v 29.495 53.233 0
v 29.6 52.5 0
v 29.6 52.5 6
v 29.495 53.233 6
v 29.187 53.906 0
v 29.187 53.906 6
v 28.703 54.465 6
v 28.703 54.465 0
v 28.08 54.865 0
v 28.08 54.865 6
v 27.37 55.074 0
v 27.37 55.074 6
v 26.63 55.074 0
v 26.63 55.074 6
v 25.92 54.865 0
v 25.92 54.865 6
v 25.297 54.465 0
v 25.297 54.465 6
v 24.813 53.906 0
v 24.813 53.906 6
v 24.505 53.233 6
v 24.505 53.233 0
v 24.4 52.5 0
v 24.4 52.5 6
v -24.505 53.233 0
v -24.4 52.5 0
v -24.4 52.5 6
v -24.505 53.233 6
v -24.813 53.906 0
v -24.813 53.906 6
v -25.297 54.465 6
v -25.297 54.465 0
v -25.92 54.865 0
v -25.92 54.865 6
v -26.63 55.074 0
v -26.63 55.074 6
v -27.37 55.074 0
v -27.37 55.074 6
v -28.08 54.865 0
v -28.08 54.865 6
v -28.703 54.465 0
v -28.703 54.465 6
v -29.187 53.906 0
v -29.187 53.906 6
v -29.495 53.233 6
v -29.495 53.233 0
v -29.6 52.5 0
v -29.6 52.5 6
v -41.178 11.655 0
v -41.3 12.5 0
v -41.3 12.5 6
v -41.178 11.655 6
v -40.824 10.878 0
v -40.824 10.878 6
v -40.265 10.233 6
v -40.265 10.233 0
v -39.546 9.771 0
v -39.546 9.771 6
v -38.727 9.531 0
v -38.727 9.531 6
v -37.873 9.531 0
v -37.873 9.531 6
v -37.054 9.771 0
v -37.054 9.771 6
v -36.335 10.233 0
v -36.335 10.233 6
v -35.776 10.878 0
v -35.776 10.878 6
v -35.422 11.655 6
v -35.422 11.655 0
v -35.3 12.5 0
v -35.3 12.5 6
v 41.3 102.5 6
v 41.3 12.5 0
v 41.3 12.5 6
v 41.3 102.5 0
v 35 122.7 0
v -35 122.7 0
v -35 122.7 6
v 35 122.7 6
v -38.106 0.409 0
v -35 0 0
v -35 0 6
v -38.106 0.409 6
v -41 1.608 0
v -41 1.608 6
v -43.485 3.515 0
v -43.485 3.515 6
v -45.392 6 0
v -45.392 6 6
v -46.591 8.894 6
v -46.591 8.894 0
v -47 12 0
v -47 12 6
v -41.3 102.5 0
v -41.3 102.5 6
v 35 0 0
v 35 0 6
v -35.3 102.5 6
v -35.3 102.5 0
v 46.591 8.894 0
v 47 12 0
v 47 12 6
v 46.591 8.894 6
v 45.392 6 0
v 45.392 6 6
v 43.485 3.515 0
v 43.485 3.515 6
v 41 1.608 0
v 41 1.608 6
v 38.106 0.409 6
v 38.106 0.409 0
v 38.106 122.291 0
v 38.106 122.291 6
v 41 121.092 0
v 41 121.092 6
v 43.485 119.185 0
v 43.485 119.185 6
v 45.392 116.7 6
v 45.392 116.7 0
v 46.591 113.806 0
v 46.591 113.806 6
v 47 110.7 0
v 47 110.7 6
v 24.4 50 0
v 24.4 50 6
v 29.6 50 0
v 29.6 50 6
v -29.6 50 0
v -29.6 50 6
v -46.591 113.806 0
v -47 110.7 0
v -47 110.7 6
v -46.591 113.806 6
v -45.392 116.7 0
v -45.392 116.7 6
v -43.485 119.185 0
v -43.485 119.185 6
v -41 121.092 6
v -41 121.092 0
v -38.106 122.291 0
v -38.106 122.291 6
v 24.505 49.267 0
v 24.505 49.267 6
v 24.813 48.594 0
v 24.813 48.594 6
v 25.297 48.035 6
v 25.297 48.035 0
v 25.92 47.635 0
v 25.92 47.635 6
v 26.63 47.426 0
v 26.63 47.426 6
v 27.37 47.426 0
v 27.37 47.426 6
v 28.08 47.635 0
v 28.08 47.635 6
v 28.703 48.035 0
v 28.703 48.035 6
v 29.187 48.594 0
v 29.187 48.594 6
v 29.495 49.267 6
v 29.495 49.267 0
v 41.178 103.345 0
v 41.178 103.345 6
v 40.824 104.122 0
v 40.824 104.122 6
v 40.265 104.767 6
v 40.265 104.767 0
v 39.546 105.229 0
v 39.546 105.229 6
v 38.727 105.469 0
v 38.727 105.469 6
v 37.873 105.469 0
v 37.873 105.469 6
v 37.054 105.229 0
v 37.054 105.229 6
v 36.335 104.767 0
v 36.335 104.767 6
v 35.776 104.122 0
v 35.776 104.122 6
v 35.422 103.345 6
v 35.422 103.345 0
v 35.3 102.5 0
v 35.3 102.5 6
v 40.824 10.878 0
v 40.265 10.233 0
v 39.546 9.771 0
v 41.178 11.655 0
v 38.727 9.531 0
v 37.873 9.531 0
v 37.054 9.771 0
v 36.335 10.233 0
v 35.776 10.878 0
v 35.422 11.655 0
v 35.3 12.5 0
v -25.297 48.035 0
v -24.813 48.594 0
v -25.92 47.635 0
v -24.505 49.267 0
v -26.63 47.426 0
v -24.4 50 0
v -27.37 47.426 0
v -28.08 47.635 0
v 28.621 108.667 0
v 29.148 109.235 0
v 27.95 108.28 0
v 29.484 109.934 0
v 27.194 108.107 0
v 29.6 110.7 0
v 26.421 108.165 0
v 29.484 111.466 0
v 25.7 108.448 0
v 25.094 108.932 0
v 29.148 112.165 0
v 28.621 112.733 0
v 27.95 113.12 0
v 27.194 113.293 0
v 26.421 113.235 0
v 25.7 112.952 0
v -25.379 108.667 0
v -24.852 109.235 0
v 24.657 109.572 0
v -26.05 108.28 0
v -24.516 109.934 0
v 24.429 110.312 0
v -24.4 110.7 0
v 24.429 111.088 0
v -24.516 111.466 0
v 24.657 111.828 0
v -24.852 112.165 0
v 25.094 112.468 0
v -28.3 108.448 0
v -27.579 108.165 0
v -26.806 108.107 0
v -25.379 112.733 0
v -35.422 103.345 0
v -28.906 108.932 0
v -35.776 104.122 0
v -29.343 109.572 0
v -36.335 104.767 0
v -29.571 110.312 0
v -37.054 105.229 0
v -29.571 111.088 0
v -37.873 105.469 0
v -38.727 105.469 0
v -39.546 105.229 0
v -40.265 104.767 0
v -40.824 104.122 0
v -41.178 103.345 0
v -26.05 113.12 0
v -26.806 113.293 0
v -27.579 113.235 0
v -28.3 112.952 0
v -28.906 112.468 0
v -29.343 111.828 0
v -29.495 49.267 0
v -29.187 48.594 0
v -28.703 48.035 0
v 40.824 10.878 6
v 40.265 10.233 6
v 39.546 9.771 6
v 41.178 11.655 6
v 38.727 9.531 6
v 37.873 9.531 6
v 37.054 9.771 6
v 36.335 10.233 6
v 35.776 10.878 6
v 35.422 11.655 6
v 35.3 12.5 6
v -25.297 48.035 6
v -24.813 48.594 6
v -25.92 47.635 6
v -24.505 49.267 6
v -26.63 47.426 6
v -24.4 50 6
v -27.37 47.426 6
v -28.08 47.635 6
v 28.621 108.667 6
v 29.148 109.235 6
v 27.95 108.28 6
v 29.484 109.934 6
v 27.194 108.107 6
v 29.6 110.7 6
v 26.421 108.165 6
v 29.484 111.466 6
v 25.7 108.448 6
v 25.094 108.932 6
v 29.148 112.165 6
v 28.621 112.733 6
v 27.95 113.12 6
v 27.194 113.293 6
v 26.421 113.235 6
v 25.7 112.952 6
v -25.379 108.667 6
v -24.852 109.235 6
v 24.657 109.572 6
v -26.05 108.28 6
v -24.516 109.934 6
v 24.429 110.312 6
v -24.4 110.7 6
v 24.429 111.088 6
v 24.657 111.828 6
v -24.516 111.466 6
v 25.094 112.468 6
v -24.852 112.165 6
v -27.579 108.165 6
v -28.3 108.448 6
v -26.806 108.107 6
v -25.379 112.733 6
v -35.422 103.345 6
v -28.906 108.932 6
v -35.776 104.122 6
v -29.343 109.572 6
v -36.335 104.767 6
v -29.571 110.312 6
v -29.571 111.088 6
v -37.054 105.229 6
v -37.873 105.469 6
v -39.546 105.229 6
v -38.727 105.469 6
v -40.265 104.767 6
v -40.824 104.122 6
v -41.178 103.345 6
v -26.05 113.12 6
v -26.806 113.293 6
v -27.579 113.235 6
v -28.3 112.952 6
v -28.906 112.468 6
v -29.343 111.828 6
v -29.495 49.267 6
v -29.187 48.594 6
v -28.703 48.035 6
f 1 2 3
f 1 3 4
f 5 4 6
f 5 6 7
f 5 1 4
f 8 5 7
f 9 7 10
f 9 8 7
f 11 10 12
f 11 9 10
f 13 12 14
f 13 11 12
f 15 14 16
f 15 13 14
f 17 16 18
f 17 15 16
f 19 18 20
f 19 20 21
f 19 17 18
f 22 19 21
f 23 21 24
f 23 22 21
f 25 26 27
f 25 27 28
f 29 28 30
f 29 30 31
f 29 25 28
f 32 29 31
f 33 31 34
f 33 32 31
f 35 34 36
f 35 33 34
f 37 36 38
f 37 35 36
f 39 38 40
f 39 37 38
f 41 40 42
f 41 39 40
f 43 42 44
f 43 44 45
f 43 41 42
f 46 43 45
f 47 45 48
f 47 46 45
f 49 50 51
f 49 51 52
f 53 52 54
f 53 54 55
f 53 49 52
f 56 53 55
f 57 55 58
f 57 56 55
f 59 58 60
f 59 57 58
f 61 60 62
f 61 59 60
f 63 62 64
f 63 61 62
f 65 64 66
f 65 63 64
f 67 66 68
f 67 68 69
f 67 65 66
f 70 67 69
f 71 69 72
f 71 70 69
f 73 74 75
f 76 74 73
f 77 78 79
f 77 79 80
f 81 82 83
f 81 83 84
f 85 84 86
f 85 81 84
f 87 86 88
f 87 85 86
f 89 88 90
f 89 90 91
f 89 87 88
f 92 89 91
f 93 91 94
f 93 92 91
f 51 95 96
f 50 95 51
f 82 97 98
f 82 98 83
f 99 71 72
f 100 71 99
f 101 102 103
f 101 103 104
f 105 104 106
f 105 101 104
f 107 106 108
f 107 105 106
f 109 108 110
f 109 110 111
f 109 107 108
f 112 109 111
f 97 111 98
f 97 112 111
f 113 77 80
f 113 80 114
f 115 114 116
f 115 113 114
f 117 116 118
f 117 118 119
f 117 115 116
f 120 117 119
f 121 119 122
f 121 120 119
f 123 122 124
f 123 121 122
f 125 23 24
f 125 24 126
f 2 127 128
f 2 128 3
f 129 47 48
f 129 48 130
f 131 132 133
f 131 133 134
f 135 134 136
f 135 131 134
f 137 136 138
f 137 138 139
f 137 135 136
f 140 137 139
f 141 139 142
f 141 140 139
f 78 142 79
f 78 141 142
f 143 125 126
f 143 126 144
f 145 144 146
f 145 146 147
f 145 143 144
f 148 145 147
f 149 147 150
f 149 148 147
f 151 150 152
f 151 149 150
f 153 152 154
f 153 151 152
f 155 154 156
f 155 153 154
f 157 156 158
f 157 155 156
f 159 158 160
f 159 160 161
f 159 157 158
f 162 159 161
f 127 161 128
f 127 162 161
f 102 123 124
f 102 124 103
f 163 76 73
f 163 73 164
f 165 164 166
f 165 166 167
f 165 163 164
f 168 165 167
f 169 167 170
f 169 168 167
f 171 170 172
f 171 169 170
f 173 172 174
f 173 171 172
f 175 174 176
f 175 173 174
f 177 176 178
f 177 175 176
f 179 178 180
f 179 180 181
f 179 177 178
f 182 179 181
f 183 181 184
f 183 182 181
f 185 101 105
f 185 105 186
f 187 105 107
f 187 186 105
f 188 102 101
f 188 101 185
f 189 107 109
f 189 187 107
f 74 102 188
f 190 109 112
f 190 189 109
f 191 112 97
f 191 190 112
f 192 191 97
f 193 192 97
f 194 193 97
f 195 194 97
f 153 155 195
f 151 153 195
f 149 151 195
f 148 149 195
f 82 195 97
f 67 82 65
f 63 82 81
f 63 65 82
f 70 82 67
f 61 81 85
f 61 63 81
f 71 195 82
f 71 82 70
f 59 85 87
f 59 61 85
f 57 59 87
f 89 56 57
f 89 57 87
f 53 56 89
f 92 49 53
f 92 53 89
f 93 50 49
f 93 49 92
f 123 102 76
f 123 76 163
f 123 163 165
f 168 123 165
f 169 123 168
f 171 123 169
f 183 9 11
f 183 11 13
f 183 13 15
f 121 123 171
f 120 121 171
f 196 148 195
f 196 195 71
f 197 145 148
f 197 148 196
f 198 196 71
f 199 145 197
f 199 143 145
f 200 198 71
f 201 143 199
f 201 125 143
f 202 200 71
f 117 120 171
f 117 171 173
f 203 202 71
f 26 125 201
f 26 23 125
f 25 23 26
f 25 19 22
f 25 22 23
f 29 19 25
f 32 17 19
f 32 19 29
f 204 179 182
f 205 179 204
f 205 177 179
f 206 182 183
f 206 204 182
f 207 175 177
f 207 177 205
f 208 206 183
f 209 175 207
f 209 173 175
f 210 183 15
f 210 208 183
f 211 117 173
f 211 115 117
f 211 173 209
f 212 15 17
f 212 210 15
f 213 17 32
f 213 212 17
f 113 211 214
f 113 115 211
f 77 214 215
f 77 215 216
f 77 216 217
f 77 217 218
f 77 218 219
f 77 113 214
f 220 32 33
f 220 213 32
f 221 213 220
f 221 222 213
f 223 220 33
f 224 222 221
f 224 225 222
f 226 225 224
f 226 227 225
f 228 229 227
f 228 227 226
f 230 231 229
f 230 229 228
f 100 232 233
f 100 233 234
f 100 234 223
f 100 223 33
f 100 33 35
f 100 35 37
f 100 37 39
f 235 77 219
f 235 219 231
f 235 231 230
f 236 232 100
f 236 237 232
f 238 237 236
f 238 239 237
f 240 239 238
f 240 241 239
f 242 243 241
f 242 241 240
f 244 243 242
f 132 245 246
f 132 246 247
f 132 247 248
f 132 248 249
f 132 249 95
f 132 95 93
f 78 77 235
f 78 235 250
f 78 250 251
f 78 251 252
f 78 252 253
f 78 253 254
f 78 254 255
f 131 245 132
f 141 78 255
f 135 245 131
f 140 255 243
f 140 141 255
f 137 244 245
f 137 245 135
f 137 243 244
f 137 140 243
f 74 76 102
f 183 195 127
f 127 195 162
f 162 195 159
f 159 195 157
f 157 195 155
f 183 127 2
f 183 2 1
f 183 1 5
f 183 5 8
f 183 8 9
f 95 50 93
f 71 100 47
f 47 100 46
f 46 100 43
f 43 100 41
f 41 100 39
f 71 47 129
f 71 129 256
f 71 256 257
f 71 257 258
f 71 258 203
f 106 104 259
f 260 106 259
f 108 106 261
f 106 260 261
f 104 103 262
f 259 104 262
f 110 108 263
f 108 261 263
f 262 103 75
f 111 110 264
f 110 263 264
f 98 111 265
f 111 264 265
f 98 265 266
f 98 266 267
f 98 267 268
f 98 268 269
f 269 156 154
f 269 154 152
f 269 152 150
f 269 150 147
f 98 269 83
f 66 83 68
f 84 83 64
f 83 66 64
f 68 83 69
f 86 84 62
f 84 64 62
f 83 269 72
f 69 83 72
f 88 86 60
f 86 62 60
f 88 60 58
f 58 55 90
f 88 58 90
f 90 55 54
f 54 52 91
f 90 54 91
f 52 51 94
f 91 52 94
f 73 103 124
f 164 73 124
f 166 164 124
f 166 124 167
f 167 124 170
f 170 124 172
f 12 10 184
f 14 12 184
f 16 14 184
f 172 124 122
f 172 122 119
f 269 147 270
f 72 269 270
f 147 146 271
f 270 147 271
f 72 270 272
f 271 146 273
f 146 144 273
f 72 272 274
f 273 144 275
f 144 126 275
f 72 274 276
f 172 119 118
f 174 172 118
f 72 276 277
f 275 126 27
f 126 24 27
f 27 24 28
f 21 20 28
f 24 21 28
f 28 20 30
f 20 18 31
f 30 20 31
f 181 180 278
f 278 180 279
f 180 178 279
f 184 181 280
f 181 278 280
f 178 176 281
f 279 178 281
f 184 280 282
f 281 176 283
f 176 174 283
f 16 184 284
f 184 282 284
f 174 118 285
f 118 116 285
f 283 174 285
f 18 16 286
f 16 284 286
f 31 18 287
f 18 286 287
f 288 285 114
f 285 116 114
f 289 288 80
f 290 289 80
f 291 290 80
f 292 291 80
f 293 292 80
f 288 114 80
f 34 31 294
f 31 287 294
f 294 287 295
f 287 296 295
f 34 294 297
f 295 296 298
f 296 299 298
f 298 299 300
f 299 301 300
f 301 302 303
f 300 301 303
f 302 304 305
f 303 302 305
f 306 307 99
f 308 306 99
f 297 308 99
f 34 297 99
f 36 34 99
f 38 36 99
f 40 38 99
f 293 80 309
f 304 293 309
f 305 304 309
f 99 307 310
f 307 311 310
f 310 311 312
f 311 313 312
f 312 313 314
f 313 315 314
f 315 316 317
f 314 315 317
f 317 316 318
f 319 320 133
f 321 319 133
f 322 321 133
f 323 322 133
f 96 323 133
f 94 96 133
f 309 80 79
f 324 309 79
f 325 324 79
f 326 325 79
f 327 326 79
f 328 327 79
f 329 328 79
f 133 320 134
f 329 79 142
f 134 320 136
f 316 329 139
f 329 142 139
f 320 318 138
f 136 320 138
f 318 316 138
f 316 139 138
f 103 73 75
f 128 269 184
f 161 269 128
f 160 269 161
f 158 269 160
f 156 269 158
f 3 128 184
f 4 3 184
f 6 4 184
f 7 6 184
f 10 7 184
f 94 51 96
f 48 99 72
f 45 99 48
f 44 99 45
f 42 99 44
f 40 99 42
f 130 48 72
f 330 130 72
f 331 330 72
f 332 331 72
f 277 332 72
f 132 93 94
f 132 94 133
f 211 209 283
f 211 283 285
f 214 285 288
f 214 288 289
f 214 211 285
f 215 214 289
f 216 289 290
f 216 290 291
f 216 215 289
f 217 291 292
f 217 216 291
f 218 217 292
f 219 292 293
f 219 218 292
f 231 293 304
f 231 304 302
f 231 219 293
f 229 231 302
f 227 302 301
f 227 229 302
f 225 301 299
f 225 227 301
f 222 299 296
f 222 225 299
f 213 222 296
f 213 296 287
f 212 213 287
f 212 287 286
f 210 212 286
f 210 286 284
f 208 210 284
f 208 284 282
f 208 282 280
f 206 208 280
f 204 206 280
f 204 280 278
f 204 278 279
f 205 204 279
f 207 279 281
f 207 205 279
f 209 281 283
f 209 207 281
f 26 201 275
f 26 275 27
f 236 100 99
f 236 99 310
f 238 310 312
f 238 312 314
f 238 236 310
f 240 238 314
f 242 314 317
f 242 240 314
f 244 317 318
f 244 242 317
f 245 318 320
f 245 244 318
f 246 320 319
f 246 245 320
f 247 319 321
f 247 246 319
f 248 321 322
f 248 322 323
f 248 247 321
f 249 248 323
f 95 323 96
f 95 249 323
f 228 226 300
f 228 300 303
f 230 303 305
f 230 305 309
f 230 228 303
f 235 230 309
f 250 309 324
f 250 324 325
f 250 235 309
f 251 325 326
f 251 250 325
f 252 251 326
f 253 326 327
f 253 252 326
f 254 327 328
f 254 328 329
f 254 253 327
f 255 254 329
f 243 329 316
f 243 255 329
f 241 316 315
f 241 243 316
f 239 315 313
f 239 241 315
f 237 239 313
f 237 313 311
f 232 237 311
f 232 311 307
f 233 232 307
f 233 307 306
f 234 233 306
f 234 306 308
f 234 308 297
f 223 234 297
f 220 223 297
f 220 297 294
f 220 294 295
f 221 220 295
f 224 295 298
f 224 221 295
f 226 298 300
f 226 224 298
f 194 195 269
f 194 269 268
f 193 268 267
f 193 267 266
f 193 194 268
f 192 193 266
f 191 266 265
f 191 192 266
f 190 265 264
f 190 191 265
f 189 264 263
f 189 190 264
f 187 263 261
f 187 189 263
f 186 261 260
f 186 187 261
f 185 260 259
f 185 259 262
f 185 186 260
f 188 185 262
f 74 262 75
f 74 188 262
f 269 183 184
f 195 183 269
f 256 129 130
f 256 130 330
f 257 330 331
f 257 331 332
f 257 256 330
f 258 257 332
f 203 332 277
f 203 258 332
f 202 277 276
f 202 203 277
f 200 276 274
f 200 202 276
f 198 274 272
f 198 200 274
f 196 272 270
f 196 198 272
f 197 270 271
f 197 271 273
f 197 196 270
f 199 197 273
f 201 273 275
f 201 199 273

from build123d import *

# Parameters (mm, degrees)
MODEL_R    = 2.6
BASE_DEPTH = 6


with BuildPart() as part:
    # Model → Base (new body)
    with BuildSketch(Plane.XY):
        with BuildLine():
            Line((35, 0), (-35, 0))
            ThreePointArc((-35, 0), (-43.485281374, 3.514718626), (-47, 12))
            Line((-47, 12), (-47, 110.7))
            ThreePointArc((-47, 110.7), (-43.485281374, 119.185281374), (-35, 122.7))
            Line((-35, 122.7), (35, 122.7))
            ThreePointArc((35, 122.7), (43.485281374, 119.185281374), (47, 110.7))
            Line((47, 110.7), (47, 12))
            ThreePointArc((47, 12), (43.485281374, 3.514718626), (35, 0))
        make_face()
        with Locations((27, 110.7)):
            Circle(MODEL_R, mode=Mode.SUBTRACT)
        with Locations((-27, 110.7)):
            Circle(MODEL_R, mode=Mode.SUBTRACT)
        with BuildLine():
            Line((-29.6, 52.5), (-29.6, 50))
            ThreePointArc((-29.6, 50), (-27, 47.4), (-24.4, 50))
            Line((-24.4, 50), (-24.4, 52.5))
            ThreePointArc((-24.4, 52.5), (-27, 55.1), (-29.6, 52.5))
        make_face(mode=Mode.SUBTRACT)
        with BuildLine():
            Line((-41.3, 102.5), (-41.3, 12.5))
            ThreePointArc((-41.3, 12.5), (-38.3, 9.5), (-35.3, 12.5))
            Line((-35.3, 12.5), (-35.3, 102.5))
            ThreePointArc((-35.3, 102.5), (-38.3, 105.5), (-41.3, 102.5))
        make_face(mode=Mode.SUBTRACT)
        with BuildLine():
            Line((24.4, 52.5), (24.4, 50))
            ThreePointArc((24.4, 50), (27, 47.4), (29.6, 50))
            Line((29.6, 50), (29.6, 52.5))
            ThreePointArc((29.6, 52.5), (27, 55.1), (24.4, 52.5))
        make_face(mode=Mode.SUBTRACT)
        with BuildLine():
            Line((41.3, 12.5), (41.3, 102.5))
            ThreePointArc((41.3, 102.5), (38.3, 105.5), (35.3, 102.5))
            Line((35.3, 102.5), (35.3, 12.5))
            ThreePointArc((35.3, 12.5), (38.3, 9.5), (41.3, 12.5))
        make_face(mode=Mode.SUBTRACT)
    extrude(amount=BASE_DEPTH)


solid = part.part
